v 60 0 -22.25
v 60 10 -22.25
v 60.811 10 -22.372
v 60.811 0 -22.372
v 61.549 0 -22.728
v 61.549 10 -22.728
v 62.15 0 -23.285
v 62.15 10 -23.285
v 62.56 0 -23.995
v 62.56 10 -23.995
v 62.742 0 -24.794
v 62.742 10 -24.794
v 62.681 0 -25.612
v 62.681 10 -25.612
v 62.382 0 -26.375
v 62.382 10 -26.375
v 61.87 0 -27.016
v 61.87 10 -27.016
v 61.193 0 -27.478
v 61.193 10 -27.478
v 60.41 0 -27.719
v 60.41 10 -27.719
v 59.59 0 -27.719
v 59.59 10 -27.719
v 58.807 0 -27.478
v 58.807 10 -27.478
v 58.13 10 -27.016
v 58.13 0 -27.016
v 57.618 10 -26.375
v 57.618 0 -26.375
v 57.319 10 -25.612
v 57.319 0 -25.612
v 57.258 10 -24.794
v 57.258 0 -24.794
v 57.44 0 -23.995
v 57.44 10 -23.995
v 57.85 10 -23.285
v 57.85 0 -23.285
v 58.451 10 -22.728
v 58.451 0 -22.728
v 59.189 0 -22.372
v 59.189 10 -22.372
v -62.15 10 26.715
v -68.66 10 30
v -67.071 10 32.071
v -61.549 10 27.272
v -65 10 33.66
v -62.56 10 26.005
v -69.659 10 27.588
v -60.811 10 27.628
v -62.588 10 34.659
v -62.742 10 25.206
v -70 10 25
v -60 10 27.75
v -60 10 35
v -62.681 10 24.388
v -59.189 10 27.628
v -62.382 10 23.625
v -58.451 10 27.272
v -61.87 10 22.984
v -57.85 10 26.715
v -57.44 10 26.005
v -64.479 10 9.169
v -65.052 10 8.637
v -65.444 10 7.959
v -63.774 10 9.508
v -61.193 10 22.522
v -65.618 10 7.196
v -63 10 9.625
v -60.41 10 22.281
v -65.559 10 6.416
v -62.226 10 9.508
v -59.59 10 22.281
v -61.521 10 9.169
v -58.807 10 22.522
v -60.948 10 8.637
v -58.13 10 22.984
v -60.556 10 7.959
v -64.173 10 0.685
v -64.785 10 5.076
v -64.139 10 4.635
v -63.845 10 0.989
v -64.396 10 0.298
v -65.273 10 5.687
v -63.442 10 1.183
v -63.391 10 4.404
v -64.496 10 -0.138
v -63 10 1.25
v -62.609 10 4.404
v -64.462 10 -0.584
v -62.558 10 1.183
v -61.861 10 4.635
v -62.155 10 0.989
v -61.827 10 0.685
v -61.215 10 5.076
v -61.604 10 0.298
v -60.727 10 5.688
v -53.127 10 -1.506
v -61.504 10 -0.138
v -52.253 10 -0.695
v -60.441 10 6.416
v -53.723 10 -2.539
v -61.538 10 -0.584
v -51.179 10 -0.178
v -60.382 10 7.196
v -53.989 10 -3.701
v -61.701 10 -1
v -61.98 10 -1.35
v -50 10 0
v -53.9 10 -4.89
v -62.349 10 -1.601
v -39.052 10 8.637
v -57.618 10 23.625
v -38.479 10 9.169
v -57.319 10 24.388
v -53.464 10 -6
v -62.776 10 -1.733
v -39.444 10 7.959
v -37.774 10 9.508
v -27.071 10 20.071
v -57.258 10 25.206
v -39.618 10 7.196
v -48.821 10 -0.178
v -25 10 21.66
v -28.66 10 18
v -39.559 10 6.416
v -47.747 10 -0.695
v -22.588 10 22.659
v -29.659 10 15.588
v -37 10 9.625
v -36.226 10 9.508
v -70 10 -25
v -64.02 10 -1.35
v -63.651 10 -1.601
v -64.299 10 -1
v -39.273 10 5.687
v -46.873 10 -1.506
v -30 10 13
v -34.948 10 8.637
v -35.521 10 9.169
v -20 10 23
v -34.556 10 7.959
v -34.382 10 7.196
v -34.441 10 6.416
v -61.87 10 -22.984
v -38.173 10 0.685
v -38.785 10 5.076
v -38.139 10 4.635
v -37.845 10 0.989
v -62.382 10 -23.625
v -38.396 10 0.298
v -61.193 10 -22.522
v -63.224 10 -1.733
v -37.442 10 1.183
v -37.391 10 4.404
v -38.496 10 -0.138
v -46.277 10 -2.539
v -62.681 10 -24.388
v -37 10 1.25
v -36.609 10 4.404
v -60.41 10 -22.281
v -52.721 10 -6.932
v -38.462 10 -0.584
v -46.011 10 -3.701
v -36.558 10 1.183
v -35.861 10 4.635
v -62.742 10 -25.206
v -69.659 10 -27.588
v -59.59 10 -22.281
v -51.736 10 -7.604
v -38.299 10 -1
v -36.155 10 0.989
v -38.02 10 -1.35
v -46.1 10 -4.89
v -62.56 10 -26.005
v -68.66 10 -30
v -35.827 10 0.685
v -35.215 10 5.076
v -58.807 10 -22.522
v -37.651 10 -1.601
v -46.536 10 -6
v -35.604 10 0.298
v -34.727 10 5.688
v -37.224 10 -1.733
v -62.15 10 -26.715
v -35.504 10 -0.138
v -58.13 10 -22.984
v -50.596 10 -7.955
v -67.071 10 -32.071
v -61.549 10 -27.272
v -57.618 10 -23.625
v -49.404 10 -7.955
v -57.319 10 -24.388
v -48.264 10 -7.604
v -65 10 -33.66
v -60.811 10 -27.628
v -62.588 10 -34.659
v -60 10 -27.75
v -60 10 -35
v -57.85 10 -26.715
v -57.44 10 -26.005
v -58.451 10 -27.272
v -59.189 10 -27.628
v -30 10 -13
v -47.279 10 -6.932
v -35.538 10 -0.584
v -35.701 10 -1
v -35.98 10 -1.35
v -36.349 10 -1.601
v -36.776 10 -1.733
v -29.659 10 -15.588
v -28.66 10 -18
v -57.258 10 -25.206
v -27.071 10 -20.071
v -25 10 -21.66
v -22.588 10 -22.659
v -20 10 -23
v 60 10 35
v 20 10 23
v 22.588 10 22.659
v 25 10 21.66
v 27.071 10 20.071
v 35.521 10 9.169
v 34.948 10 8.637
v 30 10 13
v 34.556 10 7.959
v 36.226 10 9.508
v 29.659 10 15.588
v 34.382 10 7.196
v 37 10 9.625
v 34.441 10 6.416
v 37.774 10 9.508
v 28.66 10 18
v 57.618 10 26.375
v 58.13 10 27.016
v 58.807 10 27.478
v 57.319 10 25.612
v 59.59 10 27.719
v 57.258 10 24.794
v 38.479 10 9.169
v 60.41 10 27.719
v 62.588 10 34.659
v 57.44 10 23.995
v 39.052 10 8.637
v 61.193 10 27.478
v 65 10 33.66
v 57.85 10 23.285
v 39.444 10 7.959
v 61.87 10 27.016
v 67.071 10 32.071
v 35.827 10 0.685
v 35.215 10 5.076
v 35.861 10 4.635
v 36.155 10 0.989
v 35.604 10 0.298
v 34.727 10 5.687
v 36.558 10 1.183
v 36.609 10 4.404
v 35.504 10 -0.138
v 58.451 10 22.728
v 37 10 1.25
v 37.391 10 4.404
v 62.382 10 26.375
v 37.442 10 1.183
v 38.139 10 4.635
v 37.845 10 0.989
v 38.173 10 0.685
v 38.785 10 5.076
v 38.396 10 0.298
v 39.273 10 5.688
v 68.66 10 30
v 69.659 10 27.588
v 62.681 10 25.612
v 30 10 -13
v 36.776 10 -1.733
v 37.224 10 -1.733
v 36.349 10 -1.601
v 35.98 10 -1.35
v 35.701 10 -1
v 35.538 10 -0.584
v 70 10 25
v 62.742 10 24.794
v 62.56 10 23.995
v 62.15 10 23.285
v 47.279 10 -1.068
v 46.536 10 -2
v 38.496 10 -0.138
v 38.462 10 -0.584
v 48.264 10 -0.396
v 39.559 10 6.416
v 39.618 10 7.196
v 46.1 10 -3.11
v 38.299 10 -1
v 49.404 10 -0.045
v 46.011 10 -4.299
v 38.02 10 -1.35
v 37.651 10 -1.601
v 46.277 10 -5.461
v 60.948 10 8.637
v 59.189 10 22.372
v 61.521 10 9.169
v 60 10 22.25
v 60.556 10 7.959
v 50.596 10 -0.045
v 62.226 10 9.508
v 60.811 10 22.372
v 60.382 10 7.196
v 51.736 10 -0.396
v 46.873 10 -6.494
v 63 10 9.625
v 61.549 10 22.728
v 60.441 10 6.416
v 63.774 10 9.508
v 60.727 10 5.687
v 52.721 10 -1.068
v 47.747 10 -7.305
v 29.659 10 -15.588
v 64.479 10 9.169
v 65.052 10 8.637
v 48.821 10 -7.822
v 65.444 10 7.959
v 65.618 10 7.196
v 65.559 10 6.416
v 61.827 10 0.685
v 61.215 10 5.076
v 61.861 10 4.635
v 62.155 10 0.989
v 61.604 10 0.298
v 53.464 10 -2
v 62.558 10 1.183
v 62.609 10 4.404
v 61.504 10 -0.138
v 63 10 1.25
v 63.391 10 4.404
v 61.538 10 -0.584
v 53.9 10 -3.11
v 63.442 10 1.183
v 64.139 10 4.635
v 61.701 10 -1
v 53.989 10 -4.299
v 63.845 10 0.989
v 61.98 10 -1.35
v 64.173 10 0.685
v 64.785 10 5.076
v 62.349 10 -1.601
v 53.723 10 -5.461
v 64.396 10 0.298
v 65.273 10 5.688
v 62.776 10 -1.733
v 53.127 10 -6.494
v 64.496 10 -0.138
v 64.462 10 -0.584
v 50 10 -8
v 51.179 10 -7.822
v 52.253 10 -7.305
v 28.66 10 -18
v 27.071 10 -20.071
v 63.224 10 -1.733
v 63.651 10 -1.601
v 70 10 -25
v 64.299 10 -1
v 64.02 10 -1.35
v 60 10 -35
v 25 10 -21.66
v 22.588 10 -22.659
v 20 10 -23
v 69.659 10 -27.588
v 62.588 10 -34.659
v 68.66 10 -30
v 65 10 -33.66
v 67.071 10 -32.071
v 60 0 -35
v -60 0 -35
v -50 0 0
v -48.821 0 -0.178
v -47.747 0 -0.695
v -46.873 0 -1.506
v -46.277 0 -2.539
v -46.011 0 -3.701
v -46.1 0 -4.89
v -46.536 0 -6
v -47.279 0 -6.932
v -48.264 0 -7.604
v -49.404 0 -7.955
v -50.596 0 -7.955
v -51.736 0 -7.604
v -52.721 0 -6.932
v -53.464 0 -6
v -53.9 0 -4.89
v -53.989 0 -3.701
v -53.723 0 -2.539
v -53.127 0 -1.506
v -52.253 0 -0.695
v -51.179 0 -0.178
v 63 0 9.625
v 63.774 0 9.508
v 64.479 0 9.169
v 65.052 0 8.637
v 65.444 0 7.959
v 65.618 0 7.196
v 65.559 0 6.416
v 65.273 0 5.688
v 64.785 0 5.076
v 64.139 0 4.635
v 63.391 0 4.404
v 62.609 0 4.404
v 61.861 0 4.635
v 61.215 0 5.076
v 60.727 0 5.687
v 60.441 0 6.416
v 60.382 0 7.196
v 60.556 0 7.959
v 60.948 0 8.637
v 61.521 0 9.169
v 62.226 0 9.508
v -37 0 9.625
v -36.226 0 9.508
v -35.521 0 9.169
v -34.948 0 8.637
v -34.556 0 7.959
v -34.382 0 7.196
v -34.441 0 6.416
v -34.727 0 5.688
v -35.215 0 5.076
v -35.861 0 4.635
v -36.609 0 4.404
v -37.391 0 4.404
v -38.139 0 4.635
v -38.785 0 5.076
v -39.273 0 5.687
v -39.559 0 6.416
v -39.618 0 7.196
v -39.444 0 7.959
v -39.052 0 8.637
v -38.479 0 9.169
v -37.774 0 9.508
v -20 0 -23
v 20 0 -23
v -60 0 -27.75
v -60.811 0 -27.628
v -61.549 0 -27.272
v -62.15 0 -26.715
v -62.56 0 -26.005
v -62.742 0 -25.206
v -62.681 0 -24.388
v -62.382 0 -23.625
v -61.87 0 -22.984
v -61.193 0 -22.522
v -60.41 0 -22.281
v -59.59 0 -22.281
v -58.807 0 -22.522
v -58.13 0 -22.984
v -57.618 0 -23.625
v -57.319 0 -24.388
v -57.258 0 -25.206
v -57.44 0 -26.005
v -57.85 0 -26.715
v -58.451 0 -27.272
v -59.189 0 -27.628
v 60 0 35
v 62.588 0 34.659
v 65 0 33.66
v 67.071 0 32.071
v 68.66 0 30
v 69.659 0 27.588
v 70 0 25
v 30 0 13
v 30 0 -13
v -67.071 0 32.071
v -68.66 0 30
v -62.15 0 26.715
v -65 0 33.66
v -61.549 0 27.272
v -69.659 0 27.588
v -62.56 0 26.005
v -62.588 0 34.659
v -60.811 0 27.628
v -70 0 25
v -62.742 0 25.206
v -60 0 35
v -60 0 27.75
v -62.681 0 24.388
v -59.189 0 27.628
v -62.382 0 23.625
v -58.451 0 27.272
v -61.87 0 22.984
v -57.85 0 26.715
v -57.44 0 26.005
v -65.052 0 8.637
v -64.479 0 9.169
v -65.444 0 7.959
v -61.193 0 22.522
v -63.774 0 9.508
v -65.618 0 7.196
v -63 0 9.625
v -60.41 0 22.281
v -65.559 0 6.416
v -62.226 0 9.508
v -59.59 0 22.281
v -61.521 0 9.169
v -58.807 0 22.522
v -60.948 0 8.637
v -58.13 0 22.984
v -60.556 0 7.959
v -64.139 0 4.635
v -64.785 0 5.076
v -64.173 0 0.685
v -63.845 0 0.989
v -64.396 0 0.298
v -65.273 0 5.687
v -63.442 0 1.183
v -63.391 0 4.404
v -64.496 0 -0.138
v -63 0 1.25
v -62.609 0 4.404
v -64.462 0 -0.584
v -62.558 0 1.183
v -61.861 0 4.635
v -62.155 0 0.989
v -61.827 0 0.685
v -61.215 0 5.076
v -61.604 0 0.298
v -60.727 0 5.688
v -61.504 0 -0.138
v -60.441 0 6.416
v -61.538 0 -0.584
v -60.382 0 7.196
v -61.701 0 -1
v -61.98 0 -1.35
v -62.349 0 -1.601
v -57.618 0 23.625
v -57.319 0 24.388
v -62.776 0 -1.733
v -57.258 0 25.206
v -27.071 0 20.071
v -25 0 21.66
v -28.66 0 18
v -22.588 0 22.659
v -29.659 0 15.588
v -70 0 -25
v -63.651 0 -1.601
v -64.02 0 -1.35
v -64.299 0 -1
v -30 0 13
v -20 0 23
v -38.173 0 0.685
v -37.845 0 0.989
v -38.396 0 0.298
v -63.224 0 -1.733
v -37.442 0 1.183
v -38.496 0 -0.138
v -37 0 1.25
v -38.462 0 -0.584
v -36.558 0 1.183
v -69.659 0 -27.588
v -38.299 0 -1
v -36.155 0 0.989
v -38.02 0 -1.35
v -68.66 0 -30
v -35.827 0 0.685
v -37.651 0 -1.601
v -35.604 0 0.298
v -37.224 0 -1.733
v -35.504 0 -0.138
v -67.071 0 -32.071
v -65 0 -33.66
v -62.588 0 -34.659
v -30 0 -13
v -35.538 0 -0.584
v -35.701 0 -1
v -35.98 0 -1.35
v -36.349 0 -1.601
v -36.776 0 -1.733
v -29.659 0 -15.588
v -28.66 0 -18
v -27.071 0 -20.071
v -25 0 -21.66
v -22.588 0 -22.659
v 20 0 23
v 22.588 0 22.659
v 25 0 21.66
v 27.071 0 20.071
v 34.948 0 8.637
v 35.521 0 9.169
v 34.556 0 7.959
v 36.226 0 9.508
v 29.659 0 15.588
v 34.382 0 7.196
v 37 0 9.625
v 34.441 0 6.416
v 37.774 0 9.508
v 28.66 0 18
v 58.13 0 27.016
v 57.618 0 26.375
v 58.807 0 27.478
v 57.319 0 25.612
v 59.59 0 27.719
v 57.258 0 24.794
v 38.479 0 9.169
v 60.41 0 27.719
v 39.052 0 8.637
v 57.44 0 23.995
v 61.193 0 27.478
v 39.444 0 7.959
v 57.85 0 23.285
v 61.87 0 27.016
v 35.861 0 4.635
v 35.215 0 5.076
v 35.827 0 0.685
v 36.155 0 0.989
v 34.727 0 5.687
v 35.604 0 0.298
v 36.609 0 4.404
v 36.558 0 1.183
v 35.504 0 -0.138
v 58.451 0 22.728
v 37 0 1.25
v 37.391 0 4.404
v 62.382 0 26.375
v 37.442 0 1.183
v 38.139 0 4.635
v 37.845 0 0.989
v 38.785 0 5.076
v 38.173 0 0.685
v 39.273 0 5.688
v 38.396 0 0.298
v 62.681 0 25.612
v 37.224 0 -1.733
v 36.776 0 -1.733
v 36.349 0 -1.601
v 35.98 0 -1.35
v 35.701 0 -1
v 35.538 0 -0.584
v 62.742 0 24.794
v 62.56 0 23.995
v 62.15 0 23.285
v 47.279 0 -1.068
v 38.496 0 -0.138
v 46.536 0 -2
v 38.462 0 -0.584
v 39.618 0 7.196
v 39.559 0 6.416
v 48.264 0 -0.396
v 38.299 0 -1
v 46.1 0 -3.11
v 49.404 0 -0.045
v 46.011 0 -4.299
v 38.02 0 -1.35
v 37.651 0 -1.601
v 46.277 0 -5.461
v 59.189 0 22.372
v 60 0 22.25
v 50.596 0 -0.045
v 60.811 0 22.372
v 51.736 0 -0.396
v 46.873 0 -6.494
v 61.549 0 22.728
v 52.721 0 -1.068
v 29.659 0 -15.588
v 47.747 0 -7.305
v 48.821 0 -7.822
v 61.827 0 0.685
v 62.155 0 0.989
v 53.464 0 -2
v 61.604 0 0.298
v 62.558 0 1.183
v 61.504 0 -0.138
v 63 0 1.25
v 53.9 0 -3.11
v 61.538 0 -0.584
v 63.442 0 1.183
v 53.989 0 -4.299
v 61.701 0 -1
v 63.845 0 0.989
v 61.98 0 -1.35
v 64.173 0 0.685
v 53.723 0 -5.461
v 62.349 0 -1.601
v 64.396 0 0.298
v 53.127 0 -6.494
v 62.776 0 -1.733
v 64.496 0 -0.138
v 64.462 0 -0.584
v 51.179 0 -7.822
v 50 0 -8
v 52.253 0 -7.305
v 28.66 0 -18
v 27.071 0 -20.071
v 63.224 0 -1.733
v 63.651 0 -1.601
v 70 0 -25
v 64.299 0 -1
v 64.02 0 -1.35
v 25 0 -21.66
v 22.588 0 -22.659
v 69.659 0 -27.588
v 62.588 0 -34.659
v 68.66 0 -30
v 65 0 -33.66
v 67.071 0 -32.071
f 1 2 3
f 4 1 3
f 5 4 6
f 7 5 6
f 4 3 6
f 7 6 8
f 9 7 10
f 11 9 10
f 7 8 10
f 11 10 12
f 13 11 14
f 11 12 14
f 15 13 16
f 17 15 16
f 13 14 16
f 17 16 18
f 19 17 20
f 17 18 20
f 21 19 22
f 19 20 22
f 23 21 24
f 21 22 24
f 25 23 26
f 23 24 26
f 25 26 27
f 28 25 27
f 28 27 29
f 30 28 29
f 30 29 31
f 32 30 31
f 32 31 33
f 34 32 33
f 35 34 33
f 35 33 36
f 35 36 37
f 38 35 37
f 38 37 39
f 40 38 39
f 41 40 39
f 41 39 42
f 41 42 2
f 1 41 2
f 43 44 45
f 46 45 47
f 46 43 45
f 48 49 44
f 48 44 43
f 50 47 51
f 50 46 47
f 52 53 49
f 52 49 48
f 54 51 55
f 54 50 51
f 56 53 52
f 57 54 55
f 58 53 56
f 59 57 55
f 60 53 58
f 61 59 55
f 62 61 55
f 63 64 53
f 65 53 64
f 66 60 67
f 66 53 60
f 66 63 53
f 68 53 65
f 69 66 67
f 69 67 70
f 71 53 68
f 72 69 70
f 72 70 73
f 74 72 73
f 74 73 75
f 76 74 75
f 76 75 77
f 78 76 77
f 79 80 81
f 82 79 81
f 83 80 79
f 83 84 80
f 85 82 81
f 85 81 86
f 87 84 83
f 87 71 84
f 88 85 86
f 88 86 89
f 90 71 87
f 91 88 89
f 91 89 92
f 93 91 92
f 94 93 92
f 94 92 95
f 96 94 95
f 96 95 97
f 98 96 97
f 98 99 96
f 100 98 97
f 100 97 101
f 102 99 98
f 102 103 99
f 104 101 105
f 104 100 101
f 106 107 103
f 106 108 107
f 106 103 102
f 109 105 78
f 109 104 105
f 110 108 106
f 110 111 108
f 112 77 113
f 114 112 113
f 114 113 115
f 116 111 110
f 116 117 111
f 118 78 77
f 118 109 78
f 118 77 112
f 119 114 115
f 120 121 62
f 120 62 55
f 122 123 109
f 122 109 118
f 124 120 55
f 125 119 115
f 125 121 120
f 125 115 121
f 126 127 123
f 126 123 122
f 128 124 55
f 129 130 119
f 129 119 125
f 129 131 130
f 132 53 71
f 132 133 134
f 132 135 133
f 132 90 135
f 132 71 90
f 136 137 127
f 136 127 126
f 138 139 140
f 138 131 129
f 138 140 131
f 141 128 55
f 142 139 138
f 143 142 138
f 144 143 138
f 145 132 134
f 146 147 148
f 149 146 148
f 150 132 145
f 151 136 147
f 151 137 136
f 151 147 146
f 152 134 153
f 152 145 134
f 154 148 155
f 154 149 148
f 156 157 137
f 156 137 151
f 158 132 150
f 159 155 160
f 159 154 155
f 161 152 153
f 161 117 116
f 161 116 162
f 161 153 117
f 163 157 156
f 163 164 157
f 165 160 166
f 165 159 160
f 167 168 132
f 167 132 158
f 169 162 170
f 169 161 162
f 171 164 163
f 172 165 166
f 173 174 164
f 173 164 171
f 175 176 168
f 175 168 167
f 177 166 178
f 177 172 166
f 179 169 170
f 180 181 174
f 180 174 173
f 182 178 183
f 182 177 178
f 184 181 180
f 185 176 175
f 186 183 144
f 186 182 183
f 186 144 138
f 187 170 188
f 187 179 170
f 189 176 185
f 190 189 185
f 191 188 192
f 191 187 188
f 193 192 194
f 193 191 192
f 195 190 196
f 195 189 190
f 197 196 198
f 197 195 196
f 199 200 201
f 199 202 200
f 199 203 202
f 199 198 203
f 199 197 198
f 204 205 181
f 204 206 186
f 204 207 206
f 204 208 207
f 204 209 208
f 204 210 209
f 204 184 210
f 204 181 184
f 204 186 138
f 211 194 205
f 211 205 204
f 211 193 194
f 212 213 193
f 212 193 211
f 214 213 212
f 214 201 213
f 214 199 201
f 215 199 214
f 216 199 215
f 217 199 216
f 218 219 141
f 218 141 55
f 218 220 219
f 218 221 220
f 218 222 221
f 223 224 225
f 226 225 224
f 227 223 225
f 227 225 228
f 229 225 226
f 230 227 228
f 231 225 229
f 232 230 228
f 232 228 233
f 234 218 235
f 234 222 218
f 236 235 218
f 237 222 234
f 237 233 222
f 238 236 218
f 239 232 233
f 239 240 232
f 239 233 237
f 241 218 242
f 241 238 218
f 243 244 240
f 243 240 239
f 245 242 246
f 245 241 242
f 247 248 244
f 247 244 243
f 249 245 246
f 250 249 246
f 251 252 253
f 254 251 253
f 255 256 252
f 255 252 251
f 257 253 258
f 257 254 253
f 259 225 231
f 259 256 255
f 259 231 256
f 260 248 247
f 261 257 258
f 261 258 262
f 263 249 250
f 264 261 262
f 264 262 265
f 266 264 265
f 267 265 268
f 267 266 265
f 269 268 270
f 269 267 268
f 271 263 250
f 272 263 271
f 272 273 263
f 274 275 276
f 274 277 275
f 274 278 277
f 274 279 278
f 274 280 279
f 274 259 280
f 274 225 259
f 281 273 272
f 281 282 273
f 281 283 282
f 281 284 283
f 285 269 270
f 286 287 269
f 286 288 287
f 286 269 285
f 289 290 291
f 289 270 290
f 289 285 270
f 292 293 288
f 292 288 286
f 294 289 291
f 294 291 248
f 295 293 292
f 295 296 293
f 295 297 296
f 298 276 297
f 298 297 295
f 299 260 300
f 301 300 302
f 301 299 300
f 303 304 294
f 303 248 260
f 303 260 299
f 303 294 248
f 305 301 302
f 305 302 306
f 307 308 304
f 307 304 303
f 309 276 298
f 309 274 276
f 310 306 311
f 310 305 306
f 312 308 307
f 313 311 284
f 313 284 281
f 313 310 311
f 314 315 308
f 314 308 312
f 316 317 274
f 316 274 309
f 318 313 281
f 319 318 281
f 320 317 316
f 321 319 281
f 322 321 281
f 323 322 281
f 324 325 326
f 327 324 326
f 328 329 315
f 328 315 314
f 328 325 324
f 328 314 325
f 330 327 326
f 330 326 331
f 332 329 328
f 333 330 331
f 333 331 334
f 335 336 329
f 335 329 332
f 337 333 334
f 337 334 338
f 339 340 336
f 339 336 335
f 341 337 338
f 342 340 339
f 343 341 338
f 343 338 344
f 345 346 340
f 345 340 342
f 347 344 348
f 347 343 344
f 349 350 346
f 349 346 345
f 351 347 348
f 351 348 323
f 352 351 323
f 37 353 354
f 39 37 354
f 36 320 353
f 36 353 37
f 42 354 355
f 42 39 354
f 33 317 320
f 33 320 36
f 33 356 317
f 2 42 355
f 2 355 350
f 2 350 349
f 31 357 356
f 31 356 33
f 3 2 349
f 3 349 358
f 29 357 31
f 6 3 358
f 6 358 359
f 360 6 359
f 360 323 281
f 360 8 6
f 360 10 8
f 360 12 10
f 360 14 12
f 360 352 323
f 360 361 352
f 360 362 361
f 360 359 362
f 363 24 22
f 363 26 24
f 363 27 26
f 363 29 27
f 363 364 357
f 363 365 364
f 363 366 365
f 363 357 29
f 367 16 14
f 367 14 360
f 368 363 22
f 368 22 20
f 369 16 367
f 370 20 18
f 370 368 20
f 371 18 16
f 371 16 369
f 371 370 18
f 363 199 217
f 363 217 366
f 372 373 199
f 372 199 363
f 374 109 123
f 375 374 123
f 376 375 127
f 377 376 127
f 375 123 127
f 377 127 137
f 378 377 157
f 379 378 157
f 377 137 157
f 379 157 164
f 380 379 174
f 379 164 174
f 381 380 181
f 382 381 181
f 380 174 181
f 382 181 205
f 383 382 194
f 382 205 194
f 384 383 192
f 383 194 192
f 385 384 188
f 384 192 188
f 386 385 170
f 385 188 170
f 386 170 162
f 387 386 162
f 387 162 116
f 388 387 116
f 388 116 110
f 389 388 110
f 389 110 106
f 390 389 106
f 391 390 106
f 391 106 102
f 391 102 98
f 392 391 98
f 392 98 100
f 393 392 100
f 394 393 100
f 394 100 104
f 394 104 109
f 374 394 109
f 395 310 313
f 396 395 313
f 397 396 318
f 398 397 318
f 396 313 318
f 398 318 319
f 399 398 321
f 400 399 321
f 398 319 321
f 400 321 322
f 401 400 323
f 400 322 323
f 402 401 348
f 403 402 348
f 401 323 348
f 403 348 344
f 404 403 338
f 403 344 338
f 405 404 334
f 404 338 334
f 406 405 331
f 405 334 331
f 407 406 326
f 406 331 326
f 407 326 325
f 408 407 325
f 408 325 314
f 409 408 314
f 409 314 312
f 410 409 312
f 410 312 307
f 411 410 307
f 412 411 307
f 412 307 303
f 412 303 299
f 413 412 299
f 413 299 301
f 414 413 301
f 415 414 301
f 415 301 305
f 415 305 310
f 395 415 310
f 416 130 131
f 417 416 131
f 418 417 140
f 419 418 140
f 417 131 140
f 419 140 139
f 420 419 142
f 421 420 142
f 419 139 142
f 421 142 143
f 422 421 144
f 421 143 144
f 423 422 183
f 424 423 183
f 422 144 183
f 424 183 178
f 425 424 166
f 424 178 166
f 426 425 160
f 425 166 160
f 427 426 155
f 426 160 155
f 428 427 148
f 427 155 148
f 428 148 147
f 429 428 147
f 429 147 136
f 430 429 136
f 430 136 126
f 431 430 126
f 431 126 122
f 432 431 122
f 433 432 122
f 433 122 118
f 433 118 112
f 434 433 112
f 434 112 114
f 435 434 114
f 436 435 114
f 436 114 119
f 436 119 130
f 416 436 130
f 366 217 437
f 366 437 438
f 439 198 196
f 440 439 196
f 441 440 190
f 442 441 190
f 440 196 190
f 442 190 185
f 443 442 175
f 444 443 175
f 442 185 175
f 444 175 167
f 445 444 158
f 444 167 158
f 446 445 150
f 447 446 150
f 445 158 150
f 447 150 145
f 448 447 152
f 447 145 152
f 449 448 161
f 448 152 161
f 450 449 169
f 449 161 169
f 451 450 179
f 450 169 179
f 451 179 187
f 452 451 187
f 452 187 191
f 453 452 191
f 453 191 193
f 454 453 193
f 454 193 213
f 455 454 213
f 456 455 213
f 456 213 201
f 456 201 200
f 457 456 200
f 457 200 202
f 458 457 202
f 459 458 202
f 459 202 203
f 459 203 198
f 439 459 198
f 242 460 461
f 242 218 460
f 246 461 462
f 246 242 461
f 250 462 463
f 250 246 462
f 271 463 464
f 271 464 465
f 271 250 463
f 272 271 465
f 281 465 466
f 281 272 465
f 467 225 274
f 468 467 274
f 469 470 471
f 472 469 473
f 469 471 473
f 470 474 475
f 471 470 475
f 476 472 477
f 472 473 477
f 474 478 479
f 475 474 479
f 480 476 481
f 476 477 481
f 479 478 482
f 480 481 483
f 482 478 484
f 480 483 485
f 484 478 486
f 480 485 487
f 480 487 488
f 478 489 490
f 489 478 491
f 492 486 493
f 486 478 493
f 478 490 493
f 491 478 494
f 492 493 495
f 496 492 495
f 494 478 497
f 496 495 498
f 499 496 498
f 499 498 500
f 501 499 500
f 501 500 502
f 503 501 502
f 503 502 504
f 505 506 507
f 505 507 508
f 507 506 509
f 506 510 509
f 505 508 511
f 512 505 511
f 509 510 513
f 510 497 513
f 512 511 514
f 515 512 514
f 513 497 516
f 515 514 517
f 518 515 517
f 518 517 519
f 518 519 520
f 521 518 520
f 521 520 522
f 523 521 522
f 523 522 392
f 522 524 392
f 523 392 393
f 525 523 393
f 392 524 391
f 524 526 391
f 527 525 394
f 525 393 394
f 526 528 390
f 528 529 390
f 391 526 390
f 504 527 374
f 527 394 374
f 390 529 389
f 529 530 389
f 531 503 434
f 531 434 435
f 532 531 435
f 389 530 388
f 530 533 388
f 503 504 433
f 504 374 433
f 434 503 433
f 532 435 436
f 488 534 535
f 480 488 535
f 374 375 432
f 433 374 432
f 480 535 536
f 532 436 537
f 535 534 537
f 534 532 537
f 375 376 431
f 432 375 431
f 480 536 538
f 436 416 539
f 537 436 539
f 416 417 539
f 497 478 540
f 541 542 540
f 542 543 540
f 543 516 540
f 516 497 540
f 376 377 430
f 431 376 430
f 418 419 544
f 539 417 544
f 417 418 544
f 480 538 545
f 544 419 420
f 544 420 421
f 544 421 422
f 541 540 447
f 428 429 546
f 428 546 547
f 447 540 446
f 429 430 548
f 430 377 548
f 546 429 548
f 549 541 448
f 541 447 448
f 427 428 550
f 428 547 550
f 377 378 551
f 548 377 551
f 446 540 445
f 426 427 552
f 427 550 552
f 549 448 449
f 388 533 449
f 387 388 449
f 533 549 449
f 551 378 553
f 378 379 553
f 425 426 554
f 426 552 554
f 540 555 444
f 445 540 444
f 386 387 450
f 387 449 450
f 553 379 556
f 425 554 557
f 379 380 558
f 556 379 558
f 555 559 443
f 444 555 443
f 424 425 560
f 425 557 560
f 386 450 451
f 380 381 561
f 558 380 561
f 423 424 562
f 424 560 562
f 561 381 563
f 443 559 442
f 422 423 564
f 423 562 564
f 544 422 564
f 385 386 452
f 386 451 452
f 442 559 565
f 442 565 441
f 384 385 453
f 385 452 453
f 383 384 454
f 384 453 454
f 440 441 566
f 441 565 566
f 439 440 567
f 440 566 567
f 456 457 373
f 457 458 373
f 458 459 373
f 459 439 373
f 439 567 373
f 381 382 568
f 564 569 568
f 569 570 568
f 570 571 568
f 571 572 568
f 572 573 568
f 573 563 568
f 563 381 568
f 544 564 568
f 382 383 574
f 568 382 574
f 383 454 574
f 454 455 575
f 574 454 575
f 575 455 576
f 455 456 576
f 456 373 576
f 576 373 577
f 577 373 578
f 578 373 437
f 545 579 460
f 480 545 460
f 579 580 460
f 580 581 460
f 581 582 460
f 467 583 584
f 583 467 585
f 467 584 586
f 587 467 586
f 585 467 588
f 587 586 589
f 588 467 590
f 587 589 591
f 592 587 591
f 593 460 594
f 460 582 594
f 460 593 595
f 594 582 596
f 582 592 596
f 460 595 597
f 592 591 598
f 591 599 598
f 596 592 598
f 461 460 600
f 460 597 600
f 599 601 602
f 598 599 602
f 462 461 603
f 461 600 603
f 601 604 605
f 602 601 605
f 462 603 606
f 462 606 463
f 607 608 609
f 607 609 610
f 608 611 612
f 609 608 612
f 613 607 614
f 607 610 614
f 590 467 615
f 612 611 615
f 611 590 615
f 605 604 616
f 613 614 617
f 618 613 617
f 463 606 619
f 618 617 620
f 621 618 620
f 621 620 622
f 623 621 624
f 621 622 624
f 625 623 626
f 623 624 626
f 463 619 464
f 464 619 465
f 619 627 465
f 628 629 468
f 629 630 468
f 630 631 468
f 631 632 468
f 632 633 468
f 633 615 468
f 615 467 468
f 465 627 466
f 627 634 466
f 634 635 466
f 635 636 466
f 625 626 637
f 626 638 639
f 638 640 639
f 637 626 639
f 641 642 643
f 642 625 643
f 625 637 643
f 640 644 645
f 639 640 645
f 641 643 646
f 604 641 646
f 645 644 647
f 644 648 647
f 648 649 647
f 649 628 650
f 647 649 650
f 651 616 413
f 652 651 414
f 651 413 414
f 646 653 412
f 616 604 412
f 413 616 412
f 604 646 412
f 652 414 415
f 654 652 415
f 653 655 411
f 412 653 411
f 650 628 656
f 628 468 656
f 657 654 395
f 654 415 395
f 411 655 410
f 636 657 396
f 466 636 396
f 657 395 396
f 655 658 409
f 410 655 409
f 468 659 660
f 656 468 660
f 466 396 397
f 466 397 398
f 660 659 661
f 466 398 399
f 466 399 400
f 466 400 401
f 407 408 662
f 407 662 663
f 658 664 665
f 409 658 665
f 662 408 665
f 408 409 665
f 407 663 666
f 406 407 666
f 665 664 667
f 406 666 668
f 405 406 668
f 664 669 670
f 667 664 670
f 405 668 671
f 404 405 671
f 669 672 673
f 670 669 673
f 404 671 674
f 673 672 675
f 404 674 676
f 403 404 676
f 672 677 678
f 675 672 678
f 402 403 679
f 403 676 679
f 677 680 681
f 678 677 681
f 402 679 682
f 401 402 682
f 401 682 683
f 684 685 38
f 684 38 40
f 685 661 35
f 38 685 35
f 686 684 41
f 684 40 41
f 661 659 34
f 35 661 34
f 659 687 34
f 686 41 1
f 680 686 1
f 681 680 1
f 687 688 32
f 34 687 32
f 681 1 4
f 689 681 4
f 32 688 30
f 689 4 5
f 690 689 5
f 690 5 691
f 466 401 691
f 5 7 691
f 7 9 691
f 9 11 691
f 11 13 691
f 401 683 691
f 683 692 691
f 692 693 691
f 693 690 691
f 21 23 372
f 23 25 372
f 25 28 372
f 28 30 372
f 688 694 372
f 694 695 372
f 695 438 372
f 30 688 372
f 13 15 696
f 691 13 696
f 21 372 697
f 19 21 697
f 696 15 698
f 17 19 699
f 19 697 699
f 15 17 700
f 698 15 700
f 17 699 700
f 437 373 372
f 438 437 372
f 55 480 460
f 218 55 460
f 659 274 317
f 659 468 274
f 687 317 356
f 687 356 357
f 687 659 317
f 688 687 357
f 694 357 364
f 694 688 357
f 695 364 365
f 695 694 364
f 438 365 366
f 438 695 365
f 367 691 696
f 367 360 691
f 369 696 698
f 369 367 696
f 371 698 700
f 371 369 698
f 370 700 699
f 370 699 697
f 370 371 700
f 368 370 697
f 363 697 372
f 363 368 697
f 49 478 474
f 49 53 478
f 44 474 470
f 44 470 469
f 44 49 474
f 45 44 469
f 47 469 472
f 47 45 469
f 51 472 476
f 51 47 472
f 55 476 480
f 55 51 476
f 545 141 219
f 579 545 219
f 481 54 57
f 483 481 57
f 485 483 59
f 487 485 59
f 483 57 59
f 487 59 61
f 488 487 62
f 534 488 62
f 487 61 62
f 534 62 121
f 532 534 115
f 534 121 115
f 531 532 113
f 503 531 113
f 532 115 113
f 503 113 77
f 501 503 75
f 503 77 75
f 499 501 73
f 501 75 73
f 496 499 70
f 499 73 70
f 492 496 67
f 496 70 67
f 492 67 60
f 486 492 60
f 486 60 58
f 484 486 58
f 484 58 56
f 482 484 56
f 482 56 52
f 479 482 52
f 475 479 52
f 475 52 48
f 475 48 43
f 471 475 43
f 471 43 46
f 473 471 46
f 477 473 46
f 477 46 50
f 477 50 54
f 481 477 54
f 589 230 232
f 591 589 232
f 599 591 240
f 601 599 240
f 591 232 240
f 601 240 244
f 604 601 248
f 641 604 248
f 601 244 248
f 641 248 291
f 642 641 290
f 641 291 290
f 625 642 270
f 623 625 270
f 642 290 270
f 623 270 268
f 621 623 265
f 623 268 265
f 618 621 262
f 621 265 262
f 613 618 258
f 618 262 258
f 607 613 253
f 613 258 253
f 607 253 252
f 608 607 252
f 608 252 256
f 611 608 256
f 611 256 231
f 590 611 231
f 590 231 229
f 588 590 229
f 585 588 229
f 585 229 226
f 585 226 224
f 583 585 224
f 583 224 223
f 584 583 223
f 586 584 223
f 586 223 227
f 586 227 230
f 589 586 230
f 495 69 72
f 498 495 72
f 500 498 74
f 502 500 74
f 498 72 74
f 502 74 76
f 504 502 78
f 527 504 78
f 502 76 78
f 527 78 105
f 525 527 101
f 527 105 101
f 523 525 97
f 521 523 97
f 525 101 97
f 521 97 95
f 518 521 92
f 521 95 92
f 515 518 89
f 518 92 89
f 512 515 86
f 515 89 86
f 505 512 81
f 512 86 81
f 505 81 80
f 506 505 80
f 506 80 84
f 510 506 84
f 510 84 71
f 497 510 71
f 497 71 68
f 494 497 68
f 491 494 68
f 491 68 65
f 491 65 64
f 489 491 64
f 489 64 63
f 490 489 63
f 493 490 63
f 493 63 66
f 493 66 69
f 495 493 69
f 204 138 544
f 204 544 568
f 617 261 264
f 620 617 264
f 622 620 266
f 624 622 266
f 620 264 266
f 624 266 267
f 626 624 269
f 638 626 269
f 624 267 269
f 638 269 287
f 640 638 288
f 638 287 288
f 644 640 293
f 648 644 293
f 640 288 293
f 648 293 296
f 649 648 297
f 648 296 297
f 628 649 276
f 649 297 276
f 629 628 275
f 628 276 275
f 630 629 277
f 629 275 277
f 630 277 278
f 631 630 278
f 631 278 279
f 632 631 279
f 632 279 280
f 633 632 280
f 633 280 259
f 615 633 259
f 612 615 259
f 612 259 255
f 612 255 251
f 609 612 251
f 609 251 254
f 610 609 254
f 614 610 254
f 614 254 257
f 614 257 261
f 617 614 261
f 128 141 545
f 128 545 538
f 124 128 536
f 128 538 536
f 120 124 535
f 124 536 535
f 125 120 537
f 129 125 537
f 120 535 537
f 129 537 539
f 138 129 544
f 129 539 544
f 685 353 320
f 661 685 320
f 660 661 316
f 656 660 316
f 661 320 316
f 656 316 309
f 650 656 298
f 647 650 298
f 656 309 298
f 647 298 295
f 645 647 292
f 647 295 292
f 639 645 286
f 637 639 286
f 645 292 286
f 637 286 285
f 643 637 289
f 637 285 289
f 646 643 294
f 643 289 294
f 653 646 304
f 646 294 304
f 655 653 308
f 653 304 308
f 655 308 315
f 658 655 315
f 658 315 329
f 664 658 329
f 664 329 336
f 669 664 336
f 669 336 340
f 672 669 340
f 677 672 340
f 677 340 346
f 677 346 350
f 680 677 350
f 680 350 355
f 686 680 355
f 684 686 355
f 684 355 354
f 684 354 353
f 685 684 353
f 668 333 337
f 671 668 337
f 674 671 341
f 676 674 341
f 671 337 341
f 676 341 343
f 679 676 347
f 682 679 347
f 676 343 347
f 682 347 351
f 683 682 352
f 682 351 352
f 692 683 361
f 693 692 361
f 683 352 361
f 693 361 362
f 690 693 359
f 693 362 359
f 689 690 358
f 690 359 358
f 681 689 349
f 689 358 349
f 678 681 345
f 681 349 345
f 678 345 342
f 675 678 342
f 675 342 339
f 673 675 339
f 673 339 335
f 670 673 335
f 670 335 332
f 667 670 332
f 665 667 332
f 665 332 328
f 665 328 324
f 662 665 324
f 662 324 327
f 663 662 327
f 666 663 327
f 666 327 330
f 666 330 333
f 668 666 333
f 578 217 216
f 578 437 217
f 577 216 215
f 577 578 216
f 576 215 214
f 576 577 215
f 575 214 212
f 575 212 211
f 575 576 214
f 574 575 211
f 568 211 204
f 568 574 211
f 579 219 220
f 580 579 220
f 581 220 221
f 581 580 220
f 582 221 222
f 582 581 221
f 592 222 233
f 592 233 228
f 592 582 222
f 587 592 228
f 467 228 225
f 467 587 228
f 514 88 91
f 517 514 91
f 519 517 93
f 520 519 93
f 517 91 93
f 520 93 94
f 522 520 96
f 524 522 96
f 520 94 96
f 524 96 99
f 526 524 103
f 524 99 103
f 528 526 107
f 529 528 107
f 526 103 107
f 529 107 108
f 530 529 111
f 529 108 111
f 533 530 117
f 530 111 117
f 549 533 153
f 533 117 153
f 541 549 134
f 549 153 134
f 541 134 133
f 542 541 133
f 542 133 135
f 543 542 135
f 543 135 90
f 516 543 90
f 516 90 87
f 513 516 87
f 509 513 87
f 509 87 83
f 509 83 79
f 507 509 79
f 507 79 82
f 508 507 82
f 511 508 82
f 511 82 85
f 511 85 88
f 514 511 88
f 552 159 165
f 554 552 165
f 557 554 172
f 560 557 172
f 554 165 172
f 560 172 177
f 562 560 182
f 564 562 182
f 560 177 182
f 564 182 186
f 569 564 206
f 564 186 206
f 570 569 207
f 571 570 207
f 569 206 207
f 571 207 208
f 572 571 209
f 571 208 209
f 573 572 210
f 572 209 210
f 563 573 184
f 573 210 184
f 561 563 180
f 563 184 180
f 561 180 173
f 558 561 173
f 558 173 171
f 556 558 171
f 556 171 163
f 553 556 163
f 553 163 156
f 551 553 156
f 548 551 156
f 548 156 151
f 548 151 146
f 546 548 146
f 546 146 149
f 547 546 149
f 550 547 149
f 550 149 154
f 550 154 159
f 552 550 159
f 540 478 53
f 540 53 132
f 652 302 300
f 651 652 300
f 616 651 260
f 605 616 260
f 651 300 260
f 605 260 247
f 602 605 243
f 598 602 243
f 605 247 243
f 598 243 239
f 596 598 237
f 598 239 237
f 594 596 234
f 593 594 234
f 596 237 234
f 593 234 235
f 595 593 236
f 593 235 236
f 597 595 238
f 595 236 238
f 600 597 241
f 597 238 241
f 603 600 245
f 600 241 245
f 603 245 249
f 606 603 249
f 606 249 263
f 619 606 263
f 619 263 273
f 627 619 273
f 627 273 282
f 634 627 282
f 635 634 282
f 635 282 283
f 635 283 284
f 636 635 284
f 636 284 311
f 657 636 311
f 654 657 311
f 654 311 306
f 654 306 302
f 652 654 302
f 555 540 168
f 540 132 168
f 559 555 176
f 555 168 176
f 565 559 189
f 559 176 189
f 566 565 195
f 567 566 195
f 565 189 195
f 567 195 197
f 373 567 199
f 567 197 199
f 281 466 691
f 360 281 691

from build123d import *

# Parameters (mm, degrees)
SKETCH1_W           = 140
SKETCH1_H           = 70
BOSS_EXTRUDE1_DEPTH = 10
FILLET1_R           = 10
SKETCH2_R           = 2.75
CUT_EXTRUDE1_DEPTH  = 79.89866919
SKETCH3_R           = 4
CUT_EXTRUDE2_DEPTH  = 79.89866919
SKETCH4_R           = 2.625
SKETCH4_R_2         = 1.5
CUT_EXTRUDE3_DEPTH  = 79.89866919
SKETCH5_W           = 60
SKETCH5_H           = 46
CUT_EXTRUDE4_DEPTH  = 79.89866919
FILLET3_R           = 10


with BuildPart() as part:
    # Sketch1 → Boss-Extrude1 (new body)
    with BuildSketch(Plane(origin=(0, 0, 0), x_dir=(1, 0, 0), z_dir=(0, 1, 0))):
        Rectangle(SKETCH1_W, SKETCH1_H)
    extrude(amount=BOSS_EXTRUDE1_DEPTH)

    # Fillet1
    fillet1_edges = [part.edges().sort_by_distance(p)[0] for p in [
        (70, 5, 35),
        (-70, 5, 35),
        (-70, 5, -35),
        (70, 5, -35),
    ]]
    fillet(fillet1_edges, radius=FILLET1_R)

    # Sketch2 → Cut-Extrude1 (cut, through all)
    with BuildSketch(Plane(origin=(0, 10, 0), x_dir=(1, 0, 0), z_dir=(0, 1, 0))):
        with Locations(Location((-60, -25, 0), (0, 0, 270))):
            Circle(SKETCH2_R)
        with Locations(Location((-60, 25, 0), (0, 0, 90))):
            Circle(SKETCH2_R)
        with Locations(Location((60, -25, 0), (0, 0, 90))):
            Circle(SKETCH2_R)
        with Locations(Location((60, 25, 0), (0, 0, 270))):
            Circle(SKETCH2_R)
    extrude(amount=-CUT_EXTRUDE1_DEPTH, mode=Mode.SUBTRACT)

    # Sketch3 → Cut-Extrude2 (cut, through all)
    with BuildSketch(Plane(origin=(0, 10, 0), x_dir=(1, 0, 0), z_dir=(0, 1, 0))):
        with Locations(Location((-50, 4, 0), (0, 0, 270))):
            Circle(SKETCH3_R)
        with Locations(Location((50, 4, 0), (0, 0, 90))):
            Circle(SKETCH3_R)
    extrude(amount=-CUT_EXTRUDE2_DEPTH, mode=Mode.SUBTRACT)

    # Sketch4 → Cut-Extrude3 (cut, through all)
    with BuildSketch(Plane(origin=(0, 10, 0), x_dir=(1, 0, 0), z_dir=(0, 1, 0))):
        with Locations(Location((-63, -7, 0), (0, 0, 270))):
            Circle(SKETCH4_R)
        with Locations(Location((-37, -7, 0), (0, 0, 270))):
            Circle(SKETCH4_R)
        with Locations(Location((37, -7, 0), (0, 0, 270))):
            Circle(SKETCH4_R)
        with Locations(Location((63, -7, 0), (0, 0, 270))):
            Circle(SKETCH4_R)
        with Locations(Location((-63, 0.25, 0), (0, 0, 270))):
            Circle(SKETCH4_R_2)
        with Locations(Location((-37, 0.25, 0), (0, 0, 270))):
            Circle(SKETCH4_R_2)
        with Locations(Location((37, 0.25, 0), (0, 0, 270))):
            Circle(SKETCH4_R_2)
        with Locations(Location((63, 0.25, 0), (0, 0, 270))):
            Circle(SKETCH4_R_2)
    extrude(amount=-CUT_EXTRUDE3_DEPTH, mode=Mode.SUBTRACT)

    # Sketch5 → Cut-Extrude4 (cut, through all)
    with BuildSketch(Plane(origin=(0, 10, 0), x_dir=(1, 0, 0), z_dir=(0, 1, 0))):
        Rectangle(SKETCH5_W, SKETCH5_H)
    extrude(amount=-CUT_EXTRUDE4_DEPTH, mode=Mode.SUBTRACT)

    # Fillet3
    fillet3_edges = [part.edges().sort_by_distance(p)[0] for p in [
        (-30, 5, 23),
        (-30, 5, -23),
        (30, 5, -23),
        (30, 5, 23),
    ]]
    fillet(fillet3_edges, radius=FILLET3_R)


solid = part.part
